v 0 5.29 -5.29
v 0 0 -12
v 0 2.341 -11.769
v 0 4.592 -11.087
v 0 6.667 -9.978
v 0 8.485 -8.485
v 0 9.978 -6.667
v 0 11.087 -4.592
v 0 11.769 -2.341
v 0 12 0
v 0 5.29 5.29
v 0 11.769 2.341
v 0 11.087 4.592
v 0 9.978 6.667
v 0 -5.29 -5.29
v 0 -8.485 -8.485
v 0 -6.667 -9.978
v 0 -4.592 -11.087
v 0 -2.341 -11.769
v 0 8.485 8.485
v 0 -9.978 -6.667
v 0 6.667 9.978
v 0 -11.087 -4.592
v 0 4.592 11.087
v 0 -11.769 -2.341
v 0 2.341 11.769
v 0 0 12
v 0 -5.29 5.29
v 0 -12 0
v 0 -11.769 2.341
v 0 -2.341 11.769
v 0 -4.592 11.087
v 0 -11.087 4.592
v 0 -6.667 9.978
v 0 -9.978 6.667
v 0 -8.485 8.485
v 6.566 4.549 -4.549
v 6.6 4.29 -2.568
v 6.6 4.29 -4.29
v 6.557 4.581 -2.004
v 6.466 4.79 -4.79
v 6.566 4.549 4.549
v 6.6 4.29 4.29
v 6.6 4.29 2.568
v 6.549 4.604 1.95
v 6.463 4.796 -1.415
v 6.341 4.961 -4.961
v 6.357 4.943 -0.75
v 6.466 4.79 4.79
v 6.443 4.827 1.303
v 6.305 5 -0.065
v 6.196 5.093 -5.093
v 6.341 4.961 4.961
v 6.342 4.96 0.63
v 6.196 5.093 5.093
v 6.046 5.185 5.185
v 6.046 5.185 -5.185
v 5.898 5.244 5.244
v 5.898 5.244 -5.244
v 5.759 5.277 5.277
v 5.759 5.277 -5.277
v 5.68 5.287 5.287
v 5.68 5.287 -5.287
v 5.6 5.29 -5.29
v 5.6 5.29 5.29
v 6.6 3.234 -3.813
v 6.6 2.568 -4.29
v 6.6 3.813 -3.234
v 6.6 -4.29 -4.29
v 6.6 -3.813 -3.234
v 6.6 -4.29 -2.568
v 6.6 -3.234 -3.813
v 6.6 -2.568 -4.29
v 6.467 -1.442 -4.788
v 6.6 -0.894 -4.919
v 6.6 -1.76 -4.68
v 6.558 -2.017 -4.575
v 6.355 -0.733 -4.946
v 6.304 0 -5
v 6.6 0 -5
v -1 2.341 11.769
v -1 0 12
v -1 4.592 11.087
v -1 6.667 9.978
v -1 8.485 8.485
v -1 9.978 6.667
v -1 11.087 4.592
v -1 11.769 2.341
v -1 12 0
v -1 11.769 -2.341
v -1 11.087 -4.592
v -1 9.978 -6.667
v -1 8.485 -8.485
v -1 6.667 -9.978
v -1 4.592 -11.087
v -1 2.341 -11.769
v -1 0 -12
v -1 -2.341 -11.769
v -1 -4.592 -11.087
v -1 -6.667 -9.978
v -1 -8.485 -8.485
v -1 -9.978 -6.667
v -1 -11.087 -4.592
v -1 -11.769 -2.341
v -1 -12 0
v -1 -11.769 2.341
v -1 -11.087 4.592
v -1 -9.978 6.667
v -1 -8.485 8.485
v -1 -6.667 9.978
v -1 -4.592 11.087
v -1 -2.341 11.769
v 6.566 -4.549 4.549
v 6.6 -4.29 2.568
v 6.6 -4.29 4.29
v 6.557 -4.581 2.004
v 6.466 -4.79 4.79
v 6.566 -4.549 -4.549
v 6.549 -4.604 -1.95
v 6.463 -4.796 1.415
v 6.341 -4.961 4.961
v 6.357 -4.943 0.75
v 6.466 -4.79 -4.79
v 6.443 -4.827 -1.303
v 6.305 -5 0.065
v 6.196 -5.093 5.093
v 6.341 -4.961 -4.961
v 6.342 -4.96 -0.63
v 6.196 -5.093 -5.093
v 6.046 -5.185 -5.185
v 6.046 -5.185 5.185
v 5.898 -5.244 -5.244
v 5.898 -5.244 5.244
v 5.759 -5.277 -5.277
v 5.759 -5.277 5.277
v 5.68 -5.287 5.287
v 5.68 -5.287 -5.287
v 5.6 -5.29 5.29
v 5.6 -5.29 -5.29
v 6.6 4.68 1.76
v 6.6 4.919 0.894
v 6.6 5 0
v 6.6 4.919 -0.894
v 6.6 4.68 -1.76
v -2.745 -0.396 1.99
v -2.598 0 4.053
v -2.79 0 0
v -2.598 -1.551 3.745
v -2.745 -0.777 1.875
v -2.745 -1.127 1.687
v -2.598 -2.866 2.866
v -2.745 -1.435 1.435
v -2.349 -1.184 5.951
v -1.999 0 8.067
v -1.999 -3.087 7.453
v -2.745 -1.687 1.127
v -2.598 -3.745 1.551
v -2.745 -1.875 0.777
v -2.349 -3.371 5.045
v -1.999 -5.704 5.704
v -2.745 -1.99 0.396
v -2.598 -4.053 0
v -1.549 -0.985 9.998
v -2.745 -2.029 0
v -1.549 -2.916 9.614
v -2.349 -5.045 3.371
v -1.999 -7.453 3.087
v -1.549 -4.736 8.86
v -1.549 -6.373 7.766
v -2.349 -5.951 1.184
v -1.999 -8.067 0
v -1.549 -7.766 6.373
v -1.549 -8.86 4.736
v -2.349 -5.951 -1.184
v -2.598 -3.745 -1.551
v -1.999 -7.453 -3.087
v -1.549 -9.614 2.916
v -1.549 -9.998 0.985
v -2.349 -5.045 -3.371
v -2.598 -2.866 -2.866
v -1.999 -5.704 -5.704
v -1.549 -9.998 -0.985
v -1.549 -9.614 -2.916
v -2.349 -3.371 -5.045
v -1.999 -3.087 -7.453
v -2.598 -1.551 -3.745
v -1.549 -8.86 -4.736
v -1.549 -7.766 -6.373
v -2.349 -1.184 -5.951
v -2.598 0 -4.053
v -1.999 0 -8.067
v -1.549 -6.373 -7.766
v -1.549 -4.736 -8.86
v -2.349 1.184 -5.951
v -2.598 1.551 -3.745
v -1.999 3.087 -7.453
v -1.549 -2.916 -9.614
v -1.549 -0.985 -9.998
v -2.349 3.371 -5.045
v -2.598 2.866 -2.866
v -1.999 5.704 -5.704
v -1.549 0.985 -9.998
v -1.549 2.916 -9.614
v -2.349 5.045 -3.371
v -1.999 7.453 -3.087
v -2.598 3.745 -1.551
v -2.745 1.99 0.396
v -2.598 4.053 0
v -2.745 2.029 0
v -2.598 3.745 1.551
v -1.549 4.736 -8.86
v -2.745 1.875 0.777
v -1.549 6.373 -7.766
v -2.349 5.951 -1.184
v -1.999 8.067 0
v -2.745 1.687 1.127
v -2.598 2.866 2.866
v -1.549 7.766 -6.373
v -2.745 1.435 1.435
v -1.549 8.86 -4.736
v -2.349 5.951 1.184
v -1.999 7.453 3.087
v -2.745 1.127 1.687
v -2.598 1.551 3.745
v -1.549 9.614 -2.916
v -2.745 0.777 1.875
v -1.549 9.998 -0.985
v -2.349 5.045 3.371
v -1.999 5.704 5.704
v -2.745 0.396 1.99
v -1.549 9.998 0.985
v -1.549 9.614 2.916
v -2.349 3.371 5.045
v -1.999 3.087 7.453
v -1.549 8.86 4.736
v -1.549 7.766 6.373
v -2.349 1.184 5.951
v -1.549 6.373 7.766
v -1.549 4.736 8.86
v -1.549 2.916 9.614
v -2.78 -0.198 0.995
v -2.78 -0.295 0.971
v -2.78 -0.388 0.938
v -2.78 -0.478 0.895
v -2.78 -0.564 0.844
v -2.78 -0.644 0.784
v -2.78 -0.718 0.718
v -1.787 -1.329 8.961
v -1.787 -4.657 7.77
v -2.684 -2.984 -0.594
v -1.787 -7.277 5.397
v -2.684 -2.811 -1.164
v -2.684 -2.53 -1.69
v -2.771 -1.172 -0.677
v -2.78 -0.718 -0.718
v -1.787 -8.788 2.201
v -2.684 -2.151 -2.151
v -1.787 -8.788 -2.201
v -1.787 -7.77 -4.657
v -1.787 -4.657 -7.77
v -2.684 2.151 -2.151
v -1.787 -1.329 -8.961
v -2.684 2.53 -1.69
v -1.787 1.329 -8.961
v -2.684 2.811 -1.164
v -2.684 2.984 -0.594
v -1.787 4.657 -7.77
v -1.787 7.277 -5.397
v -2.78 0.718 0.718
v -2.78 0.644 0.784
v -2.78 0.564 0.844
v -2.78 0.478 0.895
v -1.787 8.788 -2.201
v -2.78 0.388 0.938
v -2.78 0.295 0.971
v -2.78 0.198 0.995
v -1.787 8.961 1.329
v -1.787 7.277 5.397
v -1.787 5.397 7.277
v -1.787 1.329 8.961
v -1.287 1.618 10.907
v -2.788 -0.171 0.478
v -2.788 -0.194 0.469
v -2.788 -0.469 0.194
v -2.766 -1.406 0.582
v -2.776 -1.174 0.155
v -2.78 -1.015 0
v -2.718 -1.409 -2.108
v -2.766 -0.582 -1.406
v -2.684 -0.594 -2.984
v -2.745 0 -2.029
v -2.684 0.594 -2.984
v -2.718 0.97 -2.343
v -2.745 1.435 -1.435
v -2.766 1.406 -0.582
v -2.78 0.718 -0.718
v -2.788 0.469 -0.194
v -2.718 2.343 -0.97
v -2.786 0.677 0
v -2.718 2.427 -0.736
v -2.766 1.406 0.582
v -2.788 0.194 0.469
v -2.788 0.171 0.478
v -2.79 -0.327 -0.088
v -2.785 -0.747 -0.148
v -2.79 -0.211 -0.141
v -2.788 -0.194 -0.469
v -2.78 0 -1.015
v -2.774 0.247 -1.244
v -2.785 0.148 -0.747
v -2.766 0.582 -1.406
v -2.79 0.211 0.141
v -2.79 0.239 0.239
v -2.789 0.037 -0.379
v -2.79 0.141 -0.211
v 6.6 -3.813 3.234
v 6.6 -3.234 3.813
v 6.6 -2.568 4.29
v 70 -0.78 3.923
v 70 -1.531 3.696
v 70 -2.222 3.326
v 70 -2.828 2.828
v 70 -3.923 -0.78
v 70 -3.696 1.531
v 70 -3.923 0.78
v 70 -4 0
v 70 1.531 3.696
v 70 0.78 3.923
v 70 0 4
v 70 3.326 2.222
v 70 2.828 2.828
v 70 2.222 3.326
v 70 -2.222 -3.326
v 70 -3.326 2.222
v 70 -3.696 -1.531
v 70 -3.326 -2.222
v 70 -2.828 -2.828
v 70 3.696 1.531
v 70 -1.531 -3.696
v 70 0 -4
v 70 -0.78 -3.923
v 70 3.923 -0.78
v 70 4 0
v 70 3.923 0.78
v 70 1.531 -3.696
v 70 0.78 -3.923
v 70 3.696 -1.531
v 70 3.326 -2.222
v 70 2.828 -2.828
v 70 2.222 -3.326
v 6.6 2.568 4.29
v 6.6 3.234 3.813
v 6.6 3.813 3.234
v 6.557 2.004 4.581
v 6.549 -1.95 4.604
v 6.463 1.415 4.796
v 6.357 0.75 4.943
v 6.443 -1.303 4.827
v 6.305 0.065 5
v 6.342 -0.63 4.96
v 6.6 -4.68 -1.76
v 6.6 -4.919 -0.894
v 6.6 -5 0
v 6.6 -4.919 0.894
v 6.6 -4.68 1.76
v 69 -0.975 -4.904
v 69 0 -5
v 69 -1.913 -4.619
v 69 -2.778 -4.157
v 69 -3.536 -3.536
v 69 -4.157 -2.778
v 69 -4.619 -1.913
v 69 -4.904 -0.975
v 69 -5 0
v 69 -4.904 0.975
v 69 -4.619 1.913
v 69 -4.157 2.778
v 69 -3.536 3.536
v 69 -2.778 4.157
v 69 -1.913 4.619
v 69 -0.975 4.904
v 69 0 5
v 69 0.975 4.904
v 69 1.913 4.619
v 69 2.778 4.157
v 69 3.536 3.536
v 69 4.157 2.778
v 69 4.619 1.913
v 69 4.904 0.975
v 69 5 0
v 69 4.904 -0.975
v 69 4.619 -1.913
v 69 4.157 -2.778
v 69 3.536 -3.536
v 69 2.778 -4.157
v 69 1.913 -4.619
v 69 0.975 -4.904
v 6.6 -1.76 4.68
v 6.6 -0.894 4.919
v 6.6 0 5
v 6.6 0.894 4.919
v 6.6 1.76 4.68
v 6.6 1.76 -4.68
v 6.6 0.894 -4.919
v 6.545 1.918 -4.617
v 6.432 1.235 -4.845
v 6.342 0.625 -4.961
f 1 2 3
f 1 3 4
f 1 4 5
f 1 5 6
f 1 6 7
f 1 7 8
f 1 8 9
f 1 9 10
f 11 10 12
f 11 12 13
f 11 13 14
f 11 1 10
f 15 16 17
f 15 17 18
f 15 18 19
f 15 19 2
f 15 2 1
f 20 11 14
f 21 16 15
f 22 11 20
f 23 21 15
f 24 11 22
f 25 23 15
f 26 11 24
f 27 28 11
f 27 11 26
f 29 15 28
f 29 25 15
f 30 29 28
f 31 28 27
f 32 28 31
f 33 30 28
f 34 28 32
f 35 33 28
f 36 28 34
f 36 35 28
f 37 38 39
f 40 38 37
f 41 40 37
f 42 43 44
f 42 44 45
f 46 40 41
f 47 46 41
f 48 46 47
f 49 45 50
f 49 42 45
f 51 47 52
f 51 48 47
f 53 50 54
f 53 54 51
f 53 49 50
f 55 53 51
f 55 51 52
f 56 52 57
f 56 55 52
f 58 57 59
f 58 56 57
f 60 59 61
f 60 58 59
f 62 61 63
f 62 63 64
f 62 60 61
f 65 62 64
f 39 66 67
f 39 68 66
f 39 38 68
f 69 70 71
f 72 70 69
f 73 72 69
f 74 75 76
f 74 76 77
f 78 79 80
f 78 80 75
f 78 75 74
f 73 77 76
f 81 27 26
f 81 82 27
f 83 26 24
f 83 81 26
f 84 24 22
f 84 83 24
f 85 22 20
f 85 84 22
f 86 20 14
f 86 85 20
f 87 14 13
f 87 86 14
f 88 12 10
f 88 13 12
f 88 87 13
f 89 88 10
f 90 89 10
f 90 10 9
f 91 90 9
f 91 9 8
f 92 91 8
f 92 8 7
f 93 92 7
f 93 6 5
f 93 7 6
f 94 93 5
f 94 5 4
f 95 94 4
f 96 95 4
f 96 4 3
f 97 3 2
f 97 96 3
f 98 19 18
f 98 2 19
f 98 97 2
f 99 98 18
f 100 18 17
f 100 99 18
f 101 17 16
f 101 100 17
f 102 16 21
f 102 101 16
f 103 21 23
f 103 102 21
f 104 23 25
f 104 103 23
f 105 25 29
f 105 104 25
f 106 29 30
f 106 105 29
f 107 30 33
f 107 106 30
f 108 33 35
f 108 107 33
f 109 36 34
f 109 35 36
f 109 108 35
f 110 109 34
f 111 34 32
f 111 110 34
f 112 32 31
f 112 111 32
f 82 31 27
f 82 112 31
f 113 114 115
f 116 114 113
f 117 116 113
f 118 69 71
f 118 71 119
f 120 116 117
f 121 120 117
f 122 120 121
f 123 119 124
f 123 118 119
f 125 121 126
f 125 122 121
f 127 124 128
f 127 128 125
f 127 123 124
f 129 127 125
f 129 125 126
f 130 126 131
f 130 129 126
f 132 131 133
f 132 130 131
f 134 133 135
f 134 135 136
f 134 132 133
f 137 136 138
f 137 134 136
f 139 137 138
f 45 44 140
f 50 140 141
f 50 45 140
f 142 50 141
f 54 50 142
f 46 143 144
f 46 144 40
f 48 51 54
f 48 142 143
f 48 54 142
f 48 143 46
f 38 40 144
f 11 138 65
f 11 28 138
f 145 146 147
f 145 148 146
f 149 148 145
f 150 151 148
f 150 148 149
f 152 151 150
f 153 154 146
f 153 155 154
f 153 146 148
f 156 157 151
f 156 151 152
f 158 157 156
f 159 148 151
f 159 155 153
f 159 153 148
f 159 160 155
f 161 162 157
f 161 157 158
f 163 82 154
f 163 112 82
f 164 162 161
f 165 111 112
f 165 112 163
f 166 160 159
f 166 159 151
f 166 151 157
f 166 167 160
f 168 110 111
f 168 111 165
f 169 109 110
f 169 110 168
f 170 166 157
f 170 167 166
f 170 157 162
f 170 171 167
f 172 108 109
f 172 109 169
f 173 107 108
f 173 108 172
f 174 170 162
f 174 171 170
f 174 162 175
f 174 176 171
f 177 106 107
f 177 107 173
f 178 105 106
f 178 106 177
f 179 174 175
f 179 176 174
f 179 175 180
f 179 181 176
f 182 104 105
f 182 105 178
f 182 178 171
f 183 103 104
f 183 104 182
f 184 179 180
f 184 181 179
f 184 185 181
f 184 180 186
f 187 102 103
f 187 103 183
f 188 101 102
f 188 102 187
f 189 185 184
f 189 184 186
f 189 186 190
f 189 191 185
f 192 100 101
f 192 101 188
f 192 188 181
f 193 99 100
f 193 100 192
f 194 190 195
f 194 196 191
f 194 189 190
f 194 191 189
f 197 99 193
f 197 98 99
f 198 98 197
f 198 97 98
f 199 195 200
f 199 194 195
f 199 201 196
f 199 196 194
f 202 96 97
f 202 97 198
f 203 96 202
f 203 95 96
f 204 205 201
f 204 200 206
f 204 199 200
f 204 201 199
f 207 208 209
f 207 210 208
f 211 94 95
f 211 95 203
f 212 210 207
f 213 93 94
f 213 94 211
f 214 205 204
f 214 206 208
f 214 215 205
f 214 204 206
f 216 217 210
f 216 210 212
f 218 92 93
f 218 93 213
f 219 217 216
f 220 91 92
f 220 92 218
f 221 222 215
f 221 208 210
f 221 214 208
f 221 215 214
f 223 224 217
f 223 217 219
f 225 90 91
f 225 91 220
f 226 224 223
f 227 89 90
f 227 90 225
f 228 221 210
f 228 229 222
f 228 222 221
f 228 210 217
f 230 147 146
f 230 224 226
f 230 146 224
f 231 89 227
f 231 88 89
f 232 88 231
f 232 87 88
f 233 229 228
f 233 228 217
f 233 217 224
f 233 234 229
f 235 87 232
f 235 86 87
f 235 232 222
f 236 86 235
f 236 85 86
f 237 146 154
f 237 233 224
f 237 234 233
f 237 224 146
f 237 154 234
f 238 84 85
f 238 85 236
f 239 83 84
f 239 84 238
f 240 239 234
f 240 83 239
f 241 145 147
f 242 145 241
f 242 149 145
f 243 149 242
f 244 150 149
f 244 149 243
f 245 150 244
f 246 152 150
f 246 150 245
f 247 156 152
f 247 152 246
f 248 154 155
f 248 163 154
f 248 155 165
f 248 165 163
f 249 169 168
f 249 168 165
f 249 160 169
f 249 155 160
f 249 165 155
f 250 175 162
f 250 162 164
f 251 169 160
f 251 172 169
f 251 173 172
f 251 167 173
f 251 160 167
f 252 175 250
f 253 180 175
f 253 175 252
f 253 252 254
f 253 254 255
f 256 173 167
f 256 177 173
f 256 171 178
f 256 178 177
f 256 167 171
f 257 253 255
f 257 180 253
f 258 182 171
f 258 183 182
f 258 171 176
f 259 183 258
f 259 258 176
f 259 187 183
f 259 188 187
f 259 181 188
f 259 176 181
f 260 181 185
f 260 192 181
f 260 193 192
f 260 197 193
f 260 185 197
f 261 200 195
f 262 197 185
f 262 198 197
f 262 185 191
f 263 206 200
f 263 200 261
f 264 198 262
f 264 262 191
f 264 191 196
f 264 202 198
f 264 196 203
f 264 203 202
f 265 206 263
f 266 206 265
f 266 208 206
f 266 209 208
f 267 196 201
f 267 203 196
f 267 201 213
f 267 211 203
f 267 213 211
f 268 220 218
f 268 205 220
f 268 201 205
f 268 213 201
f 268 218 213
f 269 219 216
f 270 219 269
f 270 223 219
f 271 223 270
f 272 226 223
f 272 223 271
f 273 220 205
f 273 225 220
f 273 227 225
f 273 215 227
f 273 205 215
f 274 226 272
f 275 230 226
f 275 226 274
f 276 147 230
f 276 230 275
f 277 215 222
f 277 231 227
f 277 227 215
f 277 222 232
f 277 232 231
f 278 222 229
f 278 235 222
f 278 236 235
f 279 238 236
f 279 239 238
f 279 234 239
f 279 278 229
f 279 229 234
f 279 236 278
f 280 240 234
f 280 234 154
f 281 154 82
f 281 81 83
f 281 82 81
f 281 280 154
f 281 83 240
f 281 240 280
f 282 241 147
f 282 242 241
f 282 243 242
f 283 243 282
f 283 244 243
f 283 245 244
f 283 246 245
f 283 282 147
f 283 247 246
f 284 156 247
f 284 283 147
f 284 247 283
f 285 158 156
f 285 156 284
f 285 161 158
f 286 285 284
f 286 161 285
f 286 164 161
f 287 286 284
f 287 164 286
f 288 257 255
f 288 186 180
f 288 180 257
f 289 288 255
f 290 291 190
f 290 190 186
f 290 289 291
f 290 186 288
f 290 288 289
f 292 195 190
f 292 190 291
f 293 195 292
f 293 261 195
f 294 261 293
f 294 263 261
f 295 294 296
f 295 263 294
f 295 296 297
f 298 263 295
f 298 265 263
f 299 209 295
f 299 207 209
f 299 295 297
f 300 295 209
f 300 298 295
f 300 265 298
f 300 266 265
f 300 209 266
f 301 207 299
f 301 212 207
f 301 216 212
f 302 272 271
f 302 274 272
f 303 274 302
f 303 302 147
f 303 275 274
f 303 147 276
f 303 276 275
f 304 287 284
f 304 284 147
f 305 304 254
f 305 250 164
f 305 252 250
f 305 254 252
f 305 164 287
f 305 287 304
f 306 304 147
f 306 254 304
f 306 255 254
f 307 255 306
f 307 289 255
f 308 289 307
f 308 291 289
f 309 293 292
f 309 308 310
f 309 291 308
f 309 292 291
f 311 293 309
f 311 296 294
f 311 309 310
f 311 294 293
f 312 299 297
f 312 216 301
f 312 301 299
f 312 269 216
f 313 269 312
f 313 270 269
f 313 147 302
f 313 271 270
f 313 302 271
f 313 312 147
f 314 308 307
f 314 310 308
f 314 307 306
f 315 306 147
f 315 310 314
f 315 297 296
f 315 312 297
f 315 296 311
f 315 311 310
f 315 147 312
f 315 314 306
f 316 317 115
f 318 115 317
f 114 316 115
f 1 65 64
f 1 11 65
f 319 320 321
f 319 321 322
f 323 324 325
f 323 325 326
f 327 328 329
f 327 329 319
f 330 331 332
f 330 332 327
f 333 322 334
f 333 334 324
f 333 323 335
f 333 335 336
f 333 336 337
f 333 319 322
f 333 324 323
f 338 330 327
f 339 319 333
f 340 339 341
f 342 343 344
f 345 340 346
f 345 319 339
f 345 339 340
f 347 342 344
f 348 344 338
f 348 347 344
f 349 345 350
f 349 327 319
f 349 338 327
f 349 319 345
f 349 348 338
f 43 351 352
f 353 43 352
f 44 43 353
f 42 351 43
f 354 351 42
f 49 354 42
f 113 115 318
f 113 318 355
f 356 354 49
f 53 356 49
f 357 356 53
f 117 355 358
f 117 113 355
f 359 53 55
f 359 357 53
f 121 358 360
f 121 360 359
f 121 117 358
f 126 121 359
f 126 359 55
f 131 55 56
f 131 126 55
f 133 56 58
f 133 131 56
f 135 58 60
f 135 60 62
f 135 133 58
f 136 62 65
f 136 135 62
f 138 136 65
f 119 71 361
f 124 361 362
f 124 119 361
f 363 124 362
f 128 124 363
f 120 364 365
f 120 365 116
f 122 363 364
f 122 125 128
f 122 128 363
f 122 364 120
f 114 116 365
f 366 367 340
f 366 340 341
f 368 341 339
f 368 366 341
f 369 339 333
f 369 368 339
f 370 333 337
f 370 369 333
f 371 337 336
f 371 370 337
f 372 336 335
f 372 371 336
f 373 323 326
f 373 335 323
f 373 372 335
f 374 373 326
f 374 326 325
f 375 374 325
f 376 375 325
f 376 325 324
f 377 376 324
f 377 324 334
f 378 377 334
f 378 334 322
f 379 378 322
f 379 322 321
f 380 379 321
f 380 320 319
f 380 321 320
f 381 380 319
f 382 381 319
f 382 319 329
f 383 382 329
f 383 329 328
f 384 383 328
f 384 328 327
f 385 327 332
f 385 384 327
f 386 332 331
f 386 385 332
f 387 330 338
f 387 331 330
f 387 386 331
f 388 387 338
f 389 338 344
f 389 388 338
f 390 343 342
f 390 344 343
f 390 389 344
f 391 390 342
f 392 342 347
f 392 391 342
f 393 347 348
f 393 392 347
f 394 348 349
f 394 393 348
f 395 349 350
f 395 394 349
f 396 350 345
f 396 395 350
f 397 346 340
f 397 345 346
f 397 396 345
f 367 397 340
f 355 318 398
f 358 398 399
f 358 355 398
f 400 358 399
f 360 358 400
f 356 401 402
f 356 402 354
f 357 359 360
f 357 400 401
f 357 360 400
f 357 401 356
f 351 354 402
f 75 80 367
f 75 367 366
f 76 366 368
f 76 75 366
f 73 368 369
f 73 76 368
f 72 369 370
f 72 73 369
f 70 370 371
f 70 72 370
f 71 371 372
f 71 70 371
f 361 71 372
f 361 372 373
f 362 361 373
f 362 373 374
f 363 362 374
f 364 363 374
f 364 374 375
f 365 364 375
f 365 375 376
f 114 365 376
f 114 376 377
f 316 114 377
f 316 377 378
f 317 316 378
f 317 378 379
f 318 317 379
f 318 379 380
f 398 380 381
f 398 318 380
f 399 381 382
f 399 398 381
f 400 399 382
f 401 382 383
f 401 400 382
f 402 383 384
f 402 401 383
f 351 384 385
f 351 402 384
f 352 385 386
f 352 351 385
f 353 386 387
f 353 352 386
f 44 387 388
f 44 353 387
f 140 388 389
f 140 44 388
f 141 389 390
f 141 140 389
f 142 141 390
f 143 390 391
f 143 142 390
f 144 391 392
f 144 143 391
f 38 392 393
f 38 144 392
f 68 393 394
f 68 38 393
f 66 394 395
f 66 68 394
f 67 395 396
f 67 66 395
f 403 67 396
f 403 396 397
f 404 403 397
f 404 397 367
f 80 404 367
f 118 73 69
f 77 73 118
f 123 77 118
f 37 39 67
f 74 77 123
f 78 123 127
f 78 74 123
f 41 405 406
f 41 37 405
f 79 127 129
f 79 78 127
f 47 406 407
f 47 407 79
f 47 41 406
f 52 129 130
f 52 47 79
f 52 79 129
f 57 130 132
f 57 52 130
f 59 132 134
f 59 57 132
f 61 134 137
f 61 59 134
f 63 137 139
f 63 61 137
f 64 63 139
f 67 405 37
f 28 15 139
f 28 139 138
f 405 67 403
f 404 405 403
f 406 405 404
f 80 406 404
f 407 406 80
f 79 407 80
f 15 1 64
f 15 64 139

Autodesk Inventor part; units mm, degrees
ref_plane "YZ Plane" through (0, 0, 0) normal (1, 0, 0) x (0, 1, 0)
ref_plane "XZ Plane" through (0, 0, 0) normal (0, 1, 0) x (-1, 0, 0)
ref_plane "XY Plane" through (0, 0, 0) normal (0, 0, 1) x (1, 0, 0)
sketch "Náčrt1" plane through (0, 0, 0) normal (0, 1, 0) x (-1, 0, 0)
  line L0 (0, 0) -> (0, 12)
  line L1 (0, 12) -> (1, 12)
  arc A0 (2.79, 0) -> (1, 12) centre (-37.5014, 0.1235) ccw
  line L2 (2.79, 0) -> (0, 0)
  dimension "d0" = 12
  dimension "d1" = 1
revolve "Rotace1" add sketch "Náčrt1" angle 360 about axis through (-2.79, 0, 0) along (1, 0, 0)
sketch "Náčrt2" plane through (0, 0, 0) normal (1, 0, 0) x (0, 0, -1)
  line L0 (-5.29, 5.29) -> (5.29, 5.29)
  line L1 (5.29, 5.29) -> (5.29, -5.29)
  line L2 (5.29, -5.29) -> (-5.29, -5.29)
  line L3 (-5.29, -5.29) -> (-5.29, 5.29)
  point P0 (0, 0)
  dimension "d3" = 10.58
  dimension "d4" = 10.58
  dimension "d5" = 5.29
  dimension "d6" = 5.29
extrude "Vysunutí1" add sketch "Náčrt2" along normal blind 6.6
sketch "Náčrt3" plane through (6.6, 0, 0) normal (1, 0, 0) x (0, 0, -1)
  circle A0 centre (0, 0) radius 5
  dimension "d9" = 10
extrude "Vysunutí2" add sketch "Náčrt3" along normal blind 63.4
chamfer "Zkosení1" distance 1 angle 45 1 edges at (70, 0, 5)
fillet "Zaoblení1" radius 1 4 edges at (6.6, 5.29, 0) (6.6, 0, 5.29) (6.6, -5.29, 0) (6.6, 0, -5.29)
thread "Závit1" size "M10x1.5" class "6g" standard "ANSI Metric M Profile" full length
properties part number "Šroub M10x70"
